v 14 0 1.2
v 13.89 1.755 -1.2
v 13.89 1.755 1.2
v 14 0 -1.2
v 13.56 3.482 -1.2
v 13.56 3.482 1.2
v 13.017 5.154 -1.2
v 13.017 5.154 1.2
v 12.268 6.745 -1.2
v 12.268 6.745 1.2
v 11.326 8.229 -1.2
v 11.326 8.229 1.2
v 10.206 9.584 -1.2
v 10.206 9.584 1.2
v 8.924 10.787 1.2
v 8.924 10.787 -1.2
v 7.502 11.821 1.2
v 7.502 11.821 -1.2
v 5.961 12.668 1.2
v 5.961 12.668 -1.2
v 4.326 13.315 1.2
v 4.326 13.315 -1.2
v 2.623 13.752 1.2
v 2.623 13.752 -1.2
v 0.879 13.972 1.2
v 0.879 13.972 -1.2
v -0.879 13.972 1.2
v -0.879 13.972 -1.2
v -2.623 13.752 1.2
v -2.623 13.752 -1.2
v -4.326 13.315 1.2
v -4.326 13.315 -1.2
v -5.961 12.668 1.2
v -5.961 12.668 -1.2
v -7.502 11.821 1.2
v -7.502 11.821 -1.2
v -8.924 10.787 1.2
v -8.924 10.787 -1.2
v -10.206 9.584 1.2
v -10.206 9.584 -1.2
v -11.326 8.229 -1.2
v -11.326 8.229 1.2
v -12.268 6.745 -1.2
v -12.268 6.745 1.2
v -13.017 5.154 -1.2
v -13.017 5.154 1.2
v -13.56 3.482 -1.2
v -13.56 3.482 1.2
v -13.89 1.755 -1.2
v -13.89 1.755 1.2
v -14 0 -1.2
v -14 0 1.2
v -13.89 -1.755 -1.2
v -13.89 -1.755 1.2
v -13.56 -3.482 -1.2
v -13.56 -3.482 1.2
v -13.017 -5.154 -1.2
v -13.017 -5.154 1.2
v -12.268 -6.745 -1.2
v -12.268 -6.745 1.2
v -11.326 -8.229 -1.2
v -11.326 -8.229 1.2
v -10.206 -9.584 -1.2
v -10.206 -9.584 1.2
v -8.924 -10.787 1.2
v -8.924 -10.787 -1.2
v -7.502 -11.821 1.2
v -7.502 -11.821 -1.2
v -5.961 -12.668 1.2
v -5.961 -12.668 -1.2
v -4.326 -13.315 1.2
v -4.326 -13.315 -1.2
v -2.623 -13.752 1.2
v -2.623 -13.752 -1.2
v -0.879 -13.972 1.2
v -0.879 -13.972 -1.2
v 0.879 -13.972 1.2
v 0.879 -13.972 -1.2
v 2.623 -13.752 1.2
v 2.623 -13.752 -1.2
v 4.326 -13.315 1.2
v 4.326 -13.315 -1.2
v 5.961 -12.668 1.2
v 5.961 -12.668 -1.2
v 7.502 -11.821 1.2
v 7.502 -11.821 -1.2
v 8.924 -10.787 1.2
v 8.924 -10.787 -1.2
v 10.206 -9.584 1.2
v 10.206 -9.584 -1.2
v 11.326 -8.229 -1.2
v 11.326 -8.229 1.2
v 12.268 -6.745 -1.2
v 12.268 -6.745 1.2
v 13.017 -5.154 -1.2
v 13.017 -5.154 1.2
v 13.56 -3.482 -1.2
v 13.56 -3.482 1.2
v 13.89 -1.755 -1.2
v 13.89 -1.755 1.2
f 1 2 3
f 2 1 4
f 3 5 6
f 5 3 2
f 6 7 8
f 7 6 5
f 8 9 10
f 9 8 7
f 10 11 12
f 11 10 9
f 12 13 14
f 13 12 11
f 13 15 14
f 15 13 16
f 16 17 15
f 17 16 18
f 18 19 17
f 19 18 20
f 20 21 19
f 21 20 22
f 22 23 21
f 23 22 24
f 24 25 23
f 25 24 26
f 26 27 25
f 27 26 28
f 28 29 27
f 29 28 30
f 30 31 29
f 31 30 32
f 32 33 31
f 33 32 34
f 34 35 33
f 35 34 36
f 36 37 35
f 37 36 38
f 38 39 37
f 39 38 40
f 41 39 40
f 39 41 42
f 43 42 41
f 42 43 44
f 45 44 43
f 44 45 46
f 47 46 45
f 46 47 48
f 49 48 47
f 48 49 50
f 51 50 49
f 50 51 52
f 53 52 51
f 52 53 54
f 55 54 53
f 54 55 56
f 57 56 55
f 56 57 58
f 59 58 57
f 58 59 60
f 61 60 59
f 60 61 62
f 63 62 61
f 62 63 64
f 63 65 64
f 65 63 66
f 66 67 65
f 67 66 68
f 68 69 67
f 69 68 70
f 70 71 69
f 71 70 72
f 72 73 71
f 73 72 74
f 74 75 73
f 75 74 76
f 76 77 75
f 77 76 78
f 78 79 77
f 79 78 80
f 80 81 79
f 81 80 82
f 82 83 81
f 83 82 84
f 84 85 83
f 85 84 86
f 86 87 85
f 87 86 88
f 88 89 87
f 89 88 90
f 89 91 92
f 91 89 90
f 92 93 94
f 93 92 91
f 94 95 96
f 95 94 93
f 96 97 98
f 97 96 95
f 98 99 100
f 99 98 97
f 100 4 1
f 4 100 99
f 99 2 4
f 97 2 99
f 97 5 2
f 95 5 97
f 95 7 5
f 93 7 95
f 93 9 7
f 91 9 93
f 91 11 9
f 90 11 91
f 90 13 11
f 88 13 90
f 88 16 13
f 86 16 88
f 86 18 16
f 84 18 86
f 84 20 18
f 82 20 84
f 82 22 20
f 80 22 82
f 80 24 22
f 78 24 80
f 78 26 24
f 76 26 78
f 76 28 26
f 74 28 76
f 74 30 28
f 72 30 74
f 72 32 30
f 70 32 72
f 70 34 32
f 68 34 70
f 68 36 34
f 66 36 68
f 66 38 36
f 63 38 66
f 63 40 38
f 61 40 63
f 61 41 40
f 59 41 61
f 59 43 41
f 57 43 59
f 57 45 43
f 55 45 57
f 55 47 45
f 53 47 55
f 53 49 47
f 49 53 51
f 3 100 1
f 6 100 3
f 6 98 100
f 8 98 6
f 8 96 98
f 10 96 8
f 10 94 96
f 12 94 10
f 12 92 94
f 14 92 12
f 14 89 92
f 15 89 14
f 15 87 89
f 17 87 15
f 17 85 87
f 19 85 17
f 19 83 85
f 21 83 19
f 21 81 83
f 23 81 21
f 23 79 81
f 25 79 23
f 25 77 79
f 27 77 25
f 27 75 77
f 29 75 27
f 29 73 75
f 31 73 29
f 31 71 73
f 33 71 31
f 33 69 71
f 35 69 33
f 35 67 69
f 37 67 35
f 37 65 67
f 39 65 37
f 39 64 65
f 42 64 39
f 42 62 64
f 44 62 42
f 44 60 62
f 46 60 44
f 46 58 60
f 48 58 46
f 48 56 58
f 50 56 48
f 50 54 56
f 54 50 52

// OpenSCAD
difference(){
cylinder(h=2.4, r=14,center=true,$fn=50);
//cylinder(h=99, r=10,center=true,$fn=50);
}
